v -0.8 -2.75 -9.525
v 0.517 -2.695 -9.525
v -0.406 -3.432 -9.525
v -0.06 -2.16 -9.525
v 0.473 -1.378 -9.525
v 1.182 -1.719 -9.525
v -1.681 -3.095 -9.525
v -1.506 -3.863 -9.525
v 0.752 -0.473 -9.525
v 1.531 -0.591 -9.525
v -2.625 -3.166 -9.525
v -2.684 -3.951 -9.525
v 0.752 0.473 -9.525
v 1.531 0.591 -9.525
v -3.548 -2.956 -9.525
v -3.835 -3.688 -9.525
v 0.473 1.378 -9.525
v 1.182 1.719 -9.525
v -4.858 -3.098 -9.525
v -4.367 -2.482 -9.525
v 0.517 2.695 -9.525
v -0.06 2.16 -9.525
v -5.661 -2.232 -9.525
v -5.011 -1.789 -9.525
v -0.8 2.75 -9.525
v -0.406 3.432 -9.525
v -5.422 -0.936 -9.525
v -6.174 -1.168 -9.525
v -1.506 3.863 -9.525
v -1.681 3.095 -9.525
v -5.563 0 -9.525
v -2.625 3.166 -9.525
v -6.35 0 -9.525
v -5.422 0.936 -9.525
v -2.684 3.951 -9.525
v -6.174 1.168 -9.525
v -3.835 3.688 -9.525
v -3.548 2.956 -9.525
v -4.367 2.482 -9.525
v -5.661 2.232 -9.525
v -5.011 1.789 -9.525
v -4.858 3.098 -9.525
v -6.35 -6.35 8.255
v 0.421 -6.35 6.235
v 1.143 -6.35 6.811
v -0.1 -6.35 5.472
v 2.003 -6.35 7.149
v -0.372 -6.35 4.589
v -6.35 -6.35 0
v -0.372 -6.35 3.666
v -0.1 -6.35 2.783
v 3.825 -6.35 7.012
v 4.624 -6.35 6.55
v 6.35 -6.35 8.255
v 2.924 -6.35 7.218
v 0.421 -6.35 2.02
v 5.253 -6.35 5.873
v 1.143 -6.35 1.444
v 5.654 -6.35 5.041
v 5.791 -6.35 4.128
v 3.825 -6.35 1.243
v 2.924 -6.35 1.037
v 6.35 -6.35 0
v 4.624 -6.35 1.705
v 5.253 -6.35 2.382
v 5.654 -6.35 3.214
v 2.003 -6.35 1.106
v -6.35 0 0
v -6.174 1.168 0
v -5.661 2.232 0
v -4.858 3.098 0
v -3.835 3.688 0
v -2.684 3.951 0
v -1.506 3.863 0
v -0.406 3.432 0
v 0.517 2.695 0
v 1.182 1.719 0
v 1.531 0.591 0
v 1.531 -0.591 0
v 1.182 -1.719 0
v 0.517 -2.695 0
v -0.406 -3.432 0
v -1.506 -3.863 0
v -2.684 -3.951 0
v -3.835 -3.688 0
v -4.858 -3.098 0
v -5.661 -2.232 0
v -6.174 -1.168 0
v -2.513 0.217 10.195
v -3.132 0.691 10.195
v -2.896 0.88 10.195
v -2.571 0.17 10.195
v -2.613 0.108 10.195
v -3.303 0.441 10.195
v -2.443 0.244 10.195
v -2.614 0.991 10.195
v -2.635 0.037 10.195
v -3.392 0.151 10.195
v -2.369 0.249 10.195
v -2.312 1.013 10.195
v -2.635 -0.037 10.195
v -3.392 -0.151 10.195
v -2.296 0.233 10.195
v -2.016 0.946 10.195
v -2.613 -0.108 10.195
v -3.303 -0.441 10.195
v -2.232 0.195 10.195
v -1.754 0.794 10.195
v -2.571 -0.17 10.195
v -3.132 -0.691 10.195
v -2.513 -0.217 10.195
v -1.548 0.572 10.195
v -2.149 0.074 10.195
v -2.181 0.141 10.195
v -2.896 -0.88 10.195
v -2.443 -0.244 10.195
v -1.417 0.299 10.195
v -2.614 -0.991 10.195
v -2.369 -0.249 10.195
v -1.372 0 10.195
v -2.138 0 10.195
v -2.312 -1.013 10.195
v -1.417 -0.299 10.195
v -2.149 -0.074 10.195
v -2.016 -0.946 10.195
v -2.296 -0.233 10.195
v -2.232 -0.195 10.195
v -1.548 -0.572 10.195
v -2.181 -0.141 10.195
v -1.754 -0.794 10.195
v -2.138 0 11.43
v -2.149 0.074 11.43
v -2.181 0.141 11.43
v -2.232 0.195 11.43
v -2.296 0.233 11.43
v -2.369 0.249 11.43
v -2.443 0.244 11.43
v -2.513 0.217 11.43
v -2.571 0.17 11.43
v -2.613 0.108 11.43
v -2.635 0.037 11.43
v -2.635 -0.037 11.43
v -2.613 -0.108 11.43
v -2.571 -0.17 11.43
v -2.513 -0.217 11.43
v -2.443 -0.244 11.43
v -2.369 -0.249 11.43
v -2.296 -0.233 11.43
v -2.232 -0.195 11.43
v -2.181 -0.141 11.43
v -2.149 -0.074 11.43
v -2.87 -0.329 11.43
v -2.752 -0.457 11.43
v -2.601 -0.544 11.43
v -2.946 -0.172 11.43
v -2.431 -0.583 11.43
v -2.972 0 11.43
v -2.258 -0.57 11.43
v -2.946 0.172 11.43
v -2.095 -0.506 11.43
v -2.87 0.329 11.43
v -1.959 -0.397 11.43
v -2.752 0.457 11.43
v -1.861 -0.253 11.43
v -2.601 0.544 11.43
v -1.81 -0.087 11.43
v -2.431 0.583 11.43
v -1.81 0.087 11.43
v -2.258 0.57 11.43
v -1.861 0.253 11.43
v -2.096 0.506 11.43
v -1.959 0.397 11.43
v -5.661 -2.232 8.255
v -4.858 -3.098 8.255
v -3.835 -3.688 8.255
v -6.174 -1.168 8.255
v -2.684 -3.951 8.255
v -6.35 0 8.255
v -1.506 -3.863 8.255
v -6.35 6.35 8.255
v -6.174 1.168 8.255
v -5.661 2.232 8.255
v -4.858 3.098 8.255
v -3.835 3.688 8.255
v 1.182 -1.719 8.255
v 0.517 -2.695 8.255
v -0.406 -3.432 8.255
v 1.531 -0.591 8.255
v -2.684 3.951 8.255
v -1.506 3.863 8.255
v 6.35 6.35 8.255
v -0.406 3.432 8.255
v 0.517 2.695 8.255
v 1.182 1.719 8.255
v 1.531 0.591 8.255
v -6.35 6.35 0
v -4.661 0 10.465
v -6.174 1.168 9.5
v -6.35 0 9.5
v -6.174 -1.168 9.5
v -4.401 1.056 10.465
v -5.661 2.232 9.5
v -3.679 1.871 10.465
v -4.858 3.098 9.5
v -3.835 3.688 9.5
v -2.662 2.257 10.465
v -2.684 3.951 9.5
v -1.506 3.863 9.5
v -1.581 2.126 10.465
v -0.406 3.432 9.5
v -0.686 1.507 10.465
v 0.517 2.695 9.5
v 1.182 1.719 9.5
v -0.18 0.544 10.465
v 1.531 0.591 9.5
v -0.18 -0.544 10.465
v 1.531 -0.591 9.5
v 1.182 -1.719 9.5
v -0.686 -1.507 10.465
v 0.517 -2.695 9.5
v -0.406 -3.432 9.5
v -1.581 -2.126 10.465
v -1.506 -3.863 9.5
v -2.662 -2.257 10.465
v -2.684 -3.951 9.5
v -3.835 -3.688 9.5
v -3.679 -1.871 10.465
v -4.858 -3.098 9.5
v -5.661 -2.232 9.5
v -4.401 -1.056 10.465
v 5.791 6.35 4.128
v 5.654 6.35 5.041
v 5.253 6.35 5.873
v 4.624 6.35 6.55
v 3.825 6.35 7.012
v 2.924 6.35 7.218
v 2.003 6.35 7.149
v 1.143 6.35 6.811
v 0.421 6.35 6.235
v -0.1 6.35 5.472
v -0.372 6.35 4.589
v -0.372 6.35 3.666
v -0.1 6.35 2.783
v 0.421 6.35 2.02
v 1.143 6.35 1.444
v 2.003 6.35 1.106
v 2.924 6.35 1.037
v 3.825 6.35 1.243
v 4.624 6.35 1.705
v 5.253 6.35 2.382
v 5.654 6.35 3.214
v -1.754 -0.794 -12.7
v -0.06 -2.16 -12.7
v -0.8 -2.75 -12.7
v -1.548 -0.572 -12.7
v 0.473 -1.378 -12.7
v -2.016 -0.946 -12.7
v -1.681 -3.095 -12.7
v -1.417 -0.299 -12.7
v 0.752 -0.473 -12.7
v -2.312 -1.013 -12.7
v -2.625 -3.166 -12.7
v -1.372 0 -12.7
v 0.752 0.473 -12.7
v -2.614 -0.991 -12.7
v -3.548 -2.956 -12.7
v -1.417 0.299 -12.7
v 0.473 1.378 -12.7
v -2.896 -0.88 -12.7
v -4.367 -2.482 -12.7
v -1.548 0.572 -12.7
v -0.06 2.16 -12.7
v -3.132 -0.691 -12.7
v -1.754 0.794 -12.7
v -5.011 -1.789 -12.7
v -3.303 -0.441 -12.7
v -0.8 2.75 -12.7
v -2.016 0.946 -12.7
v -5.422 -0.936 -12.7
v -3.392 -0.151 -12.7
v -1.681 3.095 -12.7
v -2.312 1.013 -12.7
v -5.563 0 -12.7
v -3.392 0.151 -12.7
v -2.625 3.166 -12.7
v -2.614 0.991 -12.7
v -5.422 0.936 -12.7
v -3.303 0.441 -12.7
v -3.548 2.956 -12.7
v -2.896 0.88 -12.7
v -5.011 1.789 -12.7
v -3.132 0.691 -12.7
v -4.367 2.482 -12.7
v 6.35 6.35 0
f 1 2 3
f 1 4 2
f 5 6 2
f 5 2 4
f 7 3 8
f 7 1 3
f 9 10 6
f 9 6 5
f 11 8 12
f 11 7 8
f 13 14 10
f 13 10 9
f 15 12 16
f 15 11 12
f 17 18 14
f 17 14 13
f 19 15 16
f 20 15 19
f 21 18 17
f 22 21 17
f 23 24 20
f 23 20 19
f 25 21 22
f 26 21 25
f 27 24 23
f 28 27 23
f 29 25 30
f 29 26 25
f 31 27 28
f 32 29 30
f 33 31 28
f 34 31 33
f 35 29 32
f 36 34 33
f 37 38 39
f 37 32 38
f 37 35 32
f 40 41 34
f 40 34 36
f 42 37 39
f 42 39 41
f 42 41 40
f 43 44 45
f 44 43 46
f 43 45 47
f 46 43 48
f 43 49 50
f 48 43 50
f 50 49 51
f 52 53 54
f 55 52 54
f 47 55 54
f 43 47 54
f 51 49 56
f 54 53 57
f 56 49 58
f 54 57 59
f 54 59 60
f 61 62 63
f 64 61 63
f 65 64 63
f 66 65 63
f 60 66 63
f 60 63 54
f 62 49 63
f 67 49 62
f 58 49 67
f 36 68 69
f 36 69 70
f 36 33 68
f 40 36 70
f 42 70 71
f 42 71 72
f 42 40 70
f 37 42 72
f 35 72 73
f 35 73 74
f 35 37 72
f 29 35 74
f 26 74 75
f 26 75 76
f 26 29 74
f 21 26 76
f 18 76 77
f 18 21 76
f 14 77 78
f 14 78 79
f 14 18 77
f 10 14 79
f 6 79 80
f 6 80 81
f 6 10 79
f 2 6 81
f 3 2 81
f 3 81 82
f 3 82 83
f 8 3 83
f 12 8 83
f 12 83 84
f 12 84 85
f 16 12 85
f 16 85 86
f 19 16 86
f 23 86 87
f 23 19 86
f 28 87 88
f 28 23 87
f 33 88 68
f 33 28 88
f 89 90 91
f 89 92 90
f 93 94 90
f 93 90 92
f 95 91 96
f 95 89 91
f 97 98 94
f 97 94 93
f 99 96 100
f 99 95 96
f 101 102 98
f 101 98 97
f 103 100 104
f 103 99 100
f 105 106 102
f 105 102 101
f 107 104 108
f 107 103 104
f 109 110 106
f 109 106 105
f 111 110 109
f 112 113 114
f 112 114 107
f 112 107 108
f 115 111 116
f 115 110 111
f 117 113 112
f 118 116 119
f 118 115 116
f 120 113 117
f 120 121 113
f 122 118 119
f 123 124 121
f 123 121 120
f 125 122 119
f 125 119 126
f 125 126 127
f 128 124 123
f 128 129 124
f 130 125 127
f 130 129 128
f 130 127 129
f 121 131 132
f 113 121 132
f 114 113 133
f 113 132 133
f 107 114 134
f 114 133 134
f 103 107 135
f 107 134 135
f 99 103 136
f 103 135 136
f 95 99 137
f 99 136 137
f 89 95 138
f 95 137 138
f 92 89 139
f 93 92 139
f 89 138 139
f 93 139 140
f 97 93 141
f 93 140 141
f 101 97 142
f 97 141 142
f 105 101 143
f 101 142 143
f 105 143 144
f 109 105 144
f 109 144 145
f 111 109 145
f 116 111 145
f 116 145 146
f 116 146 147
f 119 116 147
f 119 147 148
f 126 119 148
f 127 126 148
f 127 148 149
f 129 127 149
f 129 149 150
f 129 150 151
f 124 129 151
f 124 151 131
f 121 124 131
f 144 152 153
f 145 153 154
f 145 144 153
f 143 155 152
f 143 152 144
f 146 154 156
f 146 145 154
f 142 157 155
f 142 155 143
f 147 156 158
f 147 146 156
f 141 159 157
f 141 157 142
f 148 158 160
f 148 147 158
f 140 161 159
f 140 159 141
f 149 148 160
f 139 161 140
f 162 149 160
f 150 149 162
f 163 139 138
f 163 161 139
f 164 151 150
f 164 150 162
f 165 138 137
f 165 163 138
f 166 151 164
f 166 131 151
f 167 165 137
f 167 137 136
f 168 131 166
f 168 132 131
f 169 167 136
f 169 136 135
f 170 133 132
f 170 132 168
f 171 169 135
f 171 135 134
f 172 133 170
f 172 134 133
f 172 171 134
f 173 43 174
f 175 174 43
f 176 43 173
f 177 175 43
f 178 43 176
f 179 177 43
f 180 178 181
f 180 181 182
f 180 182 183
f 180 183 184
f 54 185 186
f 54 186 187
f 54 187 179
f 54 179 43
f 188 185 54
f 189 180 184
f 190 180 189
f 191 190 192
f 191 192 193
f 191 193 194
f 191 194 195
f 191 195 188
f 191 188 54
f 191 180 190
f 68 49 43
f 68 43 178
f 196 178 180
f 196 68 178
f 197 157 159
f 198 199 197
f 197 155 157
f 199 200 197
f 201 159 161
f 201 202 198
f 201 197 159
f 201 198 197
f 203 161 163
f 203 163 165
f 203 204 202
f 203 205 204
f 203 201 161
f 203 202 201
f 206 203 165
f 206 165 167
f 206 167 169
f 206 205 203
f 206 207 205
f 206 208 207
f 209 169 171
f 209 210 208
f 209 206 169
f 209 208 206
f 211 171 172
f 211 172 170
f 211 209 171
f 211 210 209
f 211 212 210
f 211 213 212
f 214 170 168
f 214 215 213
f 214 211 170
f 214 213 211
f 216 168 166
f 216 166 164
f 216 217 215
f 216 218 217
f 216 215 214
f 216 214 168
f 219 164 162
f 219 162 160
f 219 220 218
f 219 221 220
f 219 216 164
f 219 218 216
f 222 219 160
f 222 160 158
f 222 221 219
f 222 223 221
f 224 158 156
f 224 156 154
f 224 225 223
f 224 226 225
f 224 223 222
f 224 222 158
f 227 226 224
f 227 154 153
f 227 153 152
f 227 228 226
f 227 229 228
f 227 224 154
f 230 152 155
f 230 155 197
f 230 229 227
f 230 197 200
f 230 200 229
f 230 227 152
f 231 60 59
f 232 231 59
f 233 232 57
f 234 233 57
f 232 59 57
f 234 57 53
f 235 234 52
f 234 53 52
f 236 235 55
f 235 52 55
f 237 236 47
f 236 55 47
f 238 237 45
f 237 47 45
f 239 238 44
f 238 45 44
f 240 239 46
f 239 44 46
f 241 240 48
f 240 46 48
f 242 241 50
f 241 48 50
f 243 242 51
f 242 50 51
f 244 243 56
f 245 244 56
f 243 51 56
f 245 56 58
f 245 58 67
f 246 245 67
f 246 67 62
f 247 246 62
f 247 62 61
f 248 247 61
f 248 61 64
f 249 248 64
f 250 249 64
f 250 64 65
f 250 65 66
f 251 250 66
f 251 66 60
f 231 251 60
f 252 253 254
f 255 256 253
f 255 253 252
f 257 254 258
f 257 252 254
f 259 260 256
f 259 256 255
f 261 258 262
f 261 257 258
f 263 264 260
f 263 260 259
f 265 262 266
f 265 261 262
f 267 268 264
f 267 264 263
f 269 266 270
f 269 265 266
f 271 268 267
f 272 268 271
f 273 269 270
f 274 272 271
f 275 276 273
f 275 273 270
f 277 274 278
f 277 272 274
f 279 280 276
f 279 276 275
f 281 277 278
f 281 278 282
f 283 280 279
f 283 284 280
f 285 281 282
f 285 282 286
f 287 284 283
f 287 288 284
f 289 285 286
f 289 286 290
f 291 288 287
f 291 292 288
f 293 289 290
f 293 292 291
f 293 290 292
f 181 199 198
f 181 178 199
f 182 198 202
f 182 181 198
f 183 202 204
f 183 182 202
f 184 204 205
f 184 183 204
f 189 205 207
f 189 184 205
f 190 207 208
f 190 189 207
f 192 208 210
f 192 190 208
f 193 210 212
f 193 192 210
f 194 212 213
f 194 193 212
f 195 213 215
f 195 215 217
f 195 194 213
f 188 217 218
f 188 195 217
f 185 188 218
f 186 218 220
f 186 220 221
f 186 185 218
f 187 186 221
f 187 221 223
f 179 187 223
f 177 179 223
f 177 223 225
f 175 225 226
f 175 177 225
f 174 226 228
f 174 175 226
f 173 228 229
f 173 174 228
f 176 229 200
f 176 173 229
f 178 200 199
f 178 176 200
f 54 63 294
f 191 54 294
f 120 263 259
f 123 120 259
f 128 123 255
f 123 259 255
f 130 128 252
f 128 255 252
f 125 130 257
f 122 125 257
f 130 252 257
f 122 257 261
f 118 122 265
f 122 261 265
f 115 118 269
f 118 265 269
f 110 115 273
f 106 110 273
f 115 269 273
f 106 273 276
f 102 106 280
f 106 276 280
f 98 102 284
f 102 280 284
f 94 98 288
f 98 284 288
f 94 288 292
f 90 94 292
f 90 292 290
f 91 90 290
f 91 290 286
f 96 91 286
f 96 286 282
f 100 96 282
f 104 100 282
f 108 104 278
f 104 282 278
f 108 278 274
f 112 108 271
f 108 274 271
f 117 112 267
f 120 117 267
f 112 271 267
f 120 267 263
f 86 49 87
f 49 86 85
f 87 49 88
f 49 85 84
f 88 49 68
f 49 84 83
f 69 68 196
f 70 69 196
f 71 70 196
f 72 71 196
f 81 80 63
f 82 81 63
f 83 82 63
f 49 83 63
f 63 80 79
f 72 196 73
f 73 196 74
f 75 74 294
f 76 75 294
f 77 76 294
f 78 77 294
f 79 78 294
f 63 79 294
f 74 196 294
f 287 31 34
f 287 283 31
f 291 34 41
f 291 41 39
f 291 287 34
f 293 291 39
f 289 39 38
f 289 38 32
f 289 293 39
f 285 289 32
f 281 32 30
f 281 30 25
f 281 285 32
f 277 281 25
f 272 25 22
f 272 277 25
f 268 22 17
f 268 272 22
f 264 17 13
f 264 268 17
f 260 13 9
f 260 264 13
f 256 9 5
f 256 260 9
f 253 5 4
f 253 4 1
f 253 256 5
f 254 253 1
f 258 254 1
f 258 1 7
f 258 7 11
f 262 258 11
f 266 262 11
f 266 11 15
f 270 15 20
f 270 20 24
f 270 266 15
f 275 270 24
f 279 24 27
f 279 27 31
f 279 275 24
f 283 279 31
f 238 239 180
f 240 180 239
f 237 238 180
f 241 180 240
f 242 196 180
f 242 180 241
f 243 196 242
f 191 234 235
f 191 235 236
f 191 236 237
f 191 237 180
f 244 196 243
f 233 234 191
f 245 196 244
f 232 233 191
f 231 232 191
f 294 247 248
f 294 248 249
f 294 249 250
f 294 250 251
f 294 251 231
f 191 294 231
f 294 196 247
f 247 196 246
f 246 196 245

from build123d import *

# Parameters (mm, degrees)
F0_W      = 12.7
F0_H      = 12.7
F1_DEPTH  = 8.255
F2_R      = 3.0988
F3_DEPTH  = 12.701
F7_R      = 1.016
F8_DEPTH  = 22.89513
F9_R      = 0.25
F10_DEPTH = 24.131


with BuildPart() as f1:
    # F0 (on Top) → F1 (new body)
    with BuildSketch(Plane.XY):
        Rectangle(F0_W, F0_H)
    extrude(amount=F1_DEPTH)

    # F2 (on face) → F3 (cut, through all)
    with BuildSketch(Plane.XZ.offset(6.35)):
        with Locations((2.6924, 4.1275)):
            Circle(F2_R)
    extrude(amount=-F3_DEPTH, mode=Mode.SUBTRACT)

    # F4 (on Front) → F5 (revolve)
    with BuildSketch(Plane.XZ):
        Polygon((-2.3876, 8.255), (-2.3876, 11.43), (-2.9718, 11.43), (-6.35, 9.4996), (-6.35, 8.255), align=None)
    revolve(axis=Axis((-2.3876, 0, 3.00711), (0, 0, -1)))

    # F4 (on Front) → F6 (revolve)
    with BuildSketch(Plane.XZ):
        Polygon((-2.3876, -12.7), (-2.3876, 0), (-6.35, 0), (-6.35, -9.525), (-5.5626, -9.525), (-5.5626, -12.7), align=None)
    revolve(axis=Axis((-2.3876, 0, 3.00711), (0, 0, -1)))

    # F7 (on face) → F8 (cut)
    with BuildSketch(Plane(origin=(0, 0, -12.7), x_dir=(1, 0, 0), z_dir=(0, 0, -1))):
        with Locations((-2.3876, 0)):
            Circle(F7_R)
    extrude(amount=-F8_DEPTH, mode=Mode.SUBTRACT)

    # F9 (on face) → F10 (cut, through all)
    with BuildSketch(Plane.XY.offset(11.43)):
        with Locations((-2.3876, 0)):
            Circle(F9_R)
    extrude(amount=-F10_DEPTH, mode=Mode.SUBTRACT)


solid = f1.part
